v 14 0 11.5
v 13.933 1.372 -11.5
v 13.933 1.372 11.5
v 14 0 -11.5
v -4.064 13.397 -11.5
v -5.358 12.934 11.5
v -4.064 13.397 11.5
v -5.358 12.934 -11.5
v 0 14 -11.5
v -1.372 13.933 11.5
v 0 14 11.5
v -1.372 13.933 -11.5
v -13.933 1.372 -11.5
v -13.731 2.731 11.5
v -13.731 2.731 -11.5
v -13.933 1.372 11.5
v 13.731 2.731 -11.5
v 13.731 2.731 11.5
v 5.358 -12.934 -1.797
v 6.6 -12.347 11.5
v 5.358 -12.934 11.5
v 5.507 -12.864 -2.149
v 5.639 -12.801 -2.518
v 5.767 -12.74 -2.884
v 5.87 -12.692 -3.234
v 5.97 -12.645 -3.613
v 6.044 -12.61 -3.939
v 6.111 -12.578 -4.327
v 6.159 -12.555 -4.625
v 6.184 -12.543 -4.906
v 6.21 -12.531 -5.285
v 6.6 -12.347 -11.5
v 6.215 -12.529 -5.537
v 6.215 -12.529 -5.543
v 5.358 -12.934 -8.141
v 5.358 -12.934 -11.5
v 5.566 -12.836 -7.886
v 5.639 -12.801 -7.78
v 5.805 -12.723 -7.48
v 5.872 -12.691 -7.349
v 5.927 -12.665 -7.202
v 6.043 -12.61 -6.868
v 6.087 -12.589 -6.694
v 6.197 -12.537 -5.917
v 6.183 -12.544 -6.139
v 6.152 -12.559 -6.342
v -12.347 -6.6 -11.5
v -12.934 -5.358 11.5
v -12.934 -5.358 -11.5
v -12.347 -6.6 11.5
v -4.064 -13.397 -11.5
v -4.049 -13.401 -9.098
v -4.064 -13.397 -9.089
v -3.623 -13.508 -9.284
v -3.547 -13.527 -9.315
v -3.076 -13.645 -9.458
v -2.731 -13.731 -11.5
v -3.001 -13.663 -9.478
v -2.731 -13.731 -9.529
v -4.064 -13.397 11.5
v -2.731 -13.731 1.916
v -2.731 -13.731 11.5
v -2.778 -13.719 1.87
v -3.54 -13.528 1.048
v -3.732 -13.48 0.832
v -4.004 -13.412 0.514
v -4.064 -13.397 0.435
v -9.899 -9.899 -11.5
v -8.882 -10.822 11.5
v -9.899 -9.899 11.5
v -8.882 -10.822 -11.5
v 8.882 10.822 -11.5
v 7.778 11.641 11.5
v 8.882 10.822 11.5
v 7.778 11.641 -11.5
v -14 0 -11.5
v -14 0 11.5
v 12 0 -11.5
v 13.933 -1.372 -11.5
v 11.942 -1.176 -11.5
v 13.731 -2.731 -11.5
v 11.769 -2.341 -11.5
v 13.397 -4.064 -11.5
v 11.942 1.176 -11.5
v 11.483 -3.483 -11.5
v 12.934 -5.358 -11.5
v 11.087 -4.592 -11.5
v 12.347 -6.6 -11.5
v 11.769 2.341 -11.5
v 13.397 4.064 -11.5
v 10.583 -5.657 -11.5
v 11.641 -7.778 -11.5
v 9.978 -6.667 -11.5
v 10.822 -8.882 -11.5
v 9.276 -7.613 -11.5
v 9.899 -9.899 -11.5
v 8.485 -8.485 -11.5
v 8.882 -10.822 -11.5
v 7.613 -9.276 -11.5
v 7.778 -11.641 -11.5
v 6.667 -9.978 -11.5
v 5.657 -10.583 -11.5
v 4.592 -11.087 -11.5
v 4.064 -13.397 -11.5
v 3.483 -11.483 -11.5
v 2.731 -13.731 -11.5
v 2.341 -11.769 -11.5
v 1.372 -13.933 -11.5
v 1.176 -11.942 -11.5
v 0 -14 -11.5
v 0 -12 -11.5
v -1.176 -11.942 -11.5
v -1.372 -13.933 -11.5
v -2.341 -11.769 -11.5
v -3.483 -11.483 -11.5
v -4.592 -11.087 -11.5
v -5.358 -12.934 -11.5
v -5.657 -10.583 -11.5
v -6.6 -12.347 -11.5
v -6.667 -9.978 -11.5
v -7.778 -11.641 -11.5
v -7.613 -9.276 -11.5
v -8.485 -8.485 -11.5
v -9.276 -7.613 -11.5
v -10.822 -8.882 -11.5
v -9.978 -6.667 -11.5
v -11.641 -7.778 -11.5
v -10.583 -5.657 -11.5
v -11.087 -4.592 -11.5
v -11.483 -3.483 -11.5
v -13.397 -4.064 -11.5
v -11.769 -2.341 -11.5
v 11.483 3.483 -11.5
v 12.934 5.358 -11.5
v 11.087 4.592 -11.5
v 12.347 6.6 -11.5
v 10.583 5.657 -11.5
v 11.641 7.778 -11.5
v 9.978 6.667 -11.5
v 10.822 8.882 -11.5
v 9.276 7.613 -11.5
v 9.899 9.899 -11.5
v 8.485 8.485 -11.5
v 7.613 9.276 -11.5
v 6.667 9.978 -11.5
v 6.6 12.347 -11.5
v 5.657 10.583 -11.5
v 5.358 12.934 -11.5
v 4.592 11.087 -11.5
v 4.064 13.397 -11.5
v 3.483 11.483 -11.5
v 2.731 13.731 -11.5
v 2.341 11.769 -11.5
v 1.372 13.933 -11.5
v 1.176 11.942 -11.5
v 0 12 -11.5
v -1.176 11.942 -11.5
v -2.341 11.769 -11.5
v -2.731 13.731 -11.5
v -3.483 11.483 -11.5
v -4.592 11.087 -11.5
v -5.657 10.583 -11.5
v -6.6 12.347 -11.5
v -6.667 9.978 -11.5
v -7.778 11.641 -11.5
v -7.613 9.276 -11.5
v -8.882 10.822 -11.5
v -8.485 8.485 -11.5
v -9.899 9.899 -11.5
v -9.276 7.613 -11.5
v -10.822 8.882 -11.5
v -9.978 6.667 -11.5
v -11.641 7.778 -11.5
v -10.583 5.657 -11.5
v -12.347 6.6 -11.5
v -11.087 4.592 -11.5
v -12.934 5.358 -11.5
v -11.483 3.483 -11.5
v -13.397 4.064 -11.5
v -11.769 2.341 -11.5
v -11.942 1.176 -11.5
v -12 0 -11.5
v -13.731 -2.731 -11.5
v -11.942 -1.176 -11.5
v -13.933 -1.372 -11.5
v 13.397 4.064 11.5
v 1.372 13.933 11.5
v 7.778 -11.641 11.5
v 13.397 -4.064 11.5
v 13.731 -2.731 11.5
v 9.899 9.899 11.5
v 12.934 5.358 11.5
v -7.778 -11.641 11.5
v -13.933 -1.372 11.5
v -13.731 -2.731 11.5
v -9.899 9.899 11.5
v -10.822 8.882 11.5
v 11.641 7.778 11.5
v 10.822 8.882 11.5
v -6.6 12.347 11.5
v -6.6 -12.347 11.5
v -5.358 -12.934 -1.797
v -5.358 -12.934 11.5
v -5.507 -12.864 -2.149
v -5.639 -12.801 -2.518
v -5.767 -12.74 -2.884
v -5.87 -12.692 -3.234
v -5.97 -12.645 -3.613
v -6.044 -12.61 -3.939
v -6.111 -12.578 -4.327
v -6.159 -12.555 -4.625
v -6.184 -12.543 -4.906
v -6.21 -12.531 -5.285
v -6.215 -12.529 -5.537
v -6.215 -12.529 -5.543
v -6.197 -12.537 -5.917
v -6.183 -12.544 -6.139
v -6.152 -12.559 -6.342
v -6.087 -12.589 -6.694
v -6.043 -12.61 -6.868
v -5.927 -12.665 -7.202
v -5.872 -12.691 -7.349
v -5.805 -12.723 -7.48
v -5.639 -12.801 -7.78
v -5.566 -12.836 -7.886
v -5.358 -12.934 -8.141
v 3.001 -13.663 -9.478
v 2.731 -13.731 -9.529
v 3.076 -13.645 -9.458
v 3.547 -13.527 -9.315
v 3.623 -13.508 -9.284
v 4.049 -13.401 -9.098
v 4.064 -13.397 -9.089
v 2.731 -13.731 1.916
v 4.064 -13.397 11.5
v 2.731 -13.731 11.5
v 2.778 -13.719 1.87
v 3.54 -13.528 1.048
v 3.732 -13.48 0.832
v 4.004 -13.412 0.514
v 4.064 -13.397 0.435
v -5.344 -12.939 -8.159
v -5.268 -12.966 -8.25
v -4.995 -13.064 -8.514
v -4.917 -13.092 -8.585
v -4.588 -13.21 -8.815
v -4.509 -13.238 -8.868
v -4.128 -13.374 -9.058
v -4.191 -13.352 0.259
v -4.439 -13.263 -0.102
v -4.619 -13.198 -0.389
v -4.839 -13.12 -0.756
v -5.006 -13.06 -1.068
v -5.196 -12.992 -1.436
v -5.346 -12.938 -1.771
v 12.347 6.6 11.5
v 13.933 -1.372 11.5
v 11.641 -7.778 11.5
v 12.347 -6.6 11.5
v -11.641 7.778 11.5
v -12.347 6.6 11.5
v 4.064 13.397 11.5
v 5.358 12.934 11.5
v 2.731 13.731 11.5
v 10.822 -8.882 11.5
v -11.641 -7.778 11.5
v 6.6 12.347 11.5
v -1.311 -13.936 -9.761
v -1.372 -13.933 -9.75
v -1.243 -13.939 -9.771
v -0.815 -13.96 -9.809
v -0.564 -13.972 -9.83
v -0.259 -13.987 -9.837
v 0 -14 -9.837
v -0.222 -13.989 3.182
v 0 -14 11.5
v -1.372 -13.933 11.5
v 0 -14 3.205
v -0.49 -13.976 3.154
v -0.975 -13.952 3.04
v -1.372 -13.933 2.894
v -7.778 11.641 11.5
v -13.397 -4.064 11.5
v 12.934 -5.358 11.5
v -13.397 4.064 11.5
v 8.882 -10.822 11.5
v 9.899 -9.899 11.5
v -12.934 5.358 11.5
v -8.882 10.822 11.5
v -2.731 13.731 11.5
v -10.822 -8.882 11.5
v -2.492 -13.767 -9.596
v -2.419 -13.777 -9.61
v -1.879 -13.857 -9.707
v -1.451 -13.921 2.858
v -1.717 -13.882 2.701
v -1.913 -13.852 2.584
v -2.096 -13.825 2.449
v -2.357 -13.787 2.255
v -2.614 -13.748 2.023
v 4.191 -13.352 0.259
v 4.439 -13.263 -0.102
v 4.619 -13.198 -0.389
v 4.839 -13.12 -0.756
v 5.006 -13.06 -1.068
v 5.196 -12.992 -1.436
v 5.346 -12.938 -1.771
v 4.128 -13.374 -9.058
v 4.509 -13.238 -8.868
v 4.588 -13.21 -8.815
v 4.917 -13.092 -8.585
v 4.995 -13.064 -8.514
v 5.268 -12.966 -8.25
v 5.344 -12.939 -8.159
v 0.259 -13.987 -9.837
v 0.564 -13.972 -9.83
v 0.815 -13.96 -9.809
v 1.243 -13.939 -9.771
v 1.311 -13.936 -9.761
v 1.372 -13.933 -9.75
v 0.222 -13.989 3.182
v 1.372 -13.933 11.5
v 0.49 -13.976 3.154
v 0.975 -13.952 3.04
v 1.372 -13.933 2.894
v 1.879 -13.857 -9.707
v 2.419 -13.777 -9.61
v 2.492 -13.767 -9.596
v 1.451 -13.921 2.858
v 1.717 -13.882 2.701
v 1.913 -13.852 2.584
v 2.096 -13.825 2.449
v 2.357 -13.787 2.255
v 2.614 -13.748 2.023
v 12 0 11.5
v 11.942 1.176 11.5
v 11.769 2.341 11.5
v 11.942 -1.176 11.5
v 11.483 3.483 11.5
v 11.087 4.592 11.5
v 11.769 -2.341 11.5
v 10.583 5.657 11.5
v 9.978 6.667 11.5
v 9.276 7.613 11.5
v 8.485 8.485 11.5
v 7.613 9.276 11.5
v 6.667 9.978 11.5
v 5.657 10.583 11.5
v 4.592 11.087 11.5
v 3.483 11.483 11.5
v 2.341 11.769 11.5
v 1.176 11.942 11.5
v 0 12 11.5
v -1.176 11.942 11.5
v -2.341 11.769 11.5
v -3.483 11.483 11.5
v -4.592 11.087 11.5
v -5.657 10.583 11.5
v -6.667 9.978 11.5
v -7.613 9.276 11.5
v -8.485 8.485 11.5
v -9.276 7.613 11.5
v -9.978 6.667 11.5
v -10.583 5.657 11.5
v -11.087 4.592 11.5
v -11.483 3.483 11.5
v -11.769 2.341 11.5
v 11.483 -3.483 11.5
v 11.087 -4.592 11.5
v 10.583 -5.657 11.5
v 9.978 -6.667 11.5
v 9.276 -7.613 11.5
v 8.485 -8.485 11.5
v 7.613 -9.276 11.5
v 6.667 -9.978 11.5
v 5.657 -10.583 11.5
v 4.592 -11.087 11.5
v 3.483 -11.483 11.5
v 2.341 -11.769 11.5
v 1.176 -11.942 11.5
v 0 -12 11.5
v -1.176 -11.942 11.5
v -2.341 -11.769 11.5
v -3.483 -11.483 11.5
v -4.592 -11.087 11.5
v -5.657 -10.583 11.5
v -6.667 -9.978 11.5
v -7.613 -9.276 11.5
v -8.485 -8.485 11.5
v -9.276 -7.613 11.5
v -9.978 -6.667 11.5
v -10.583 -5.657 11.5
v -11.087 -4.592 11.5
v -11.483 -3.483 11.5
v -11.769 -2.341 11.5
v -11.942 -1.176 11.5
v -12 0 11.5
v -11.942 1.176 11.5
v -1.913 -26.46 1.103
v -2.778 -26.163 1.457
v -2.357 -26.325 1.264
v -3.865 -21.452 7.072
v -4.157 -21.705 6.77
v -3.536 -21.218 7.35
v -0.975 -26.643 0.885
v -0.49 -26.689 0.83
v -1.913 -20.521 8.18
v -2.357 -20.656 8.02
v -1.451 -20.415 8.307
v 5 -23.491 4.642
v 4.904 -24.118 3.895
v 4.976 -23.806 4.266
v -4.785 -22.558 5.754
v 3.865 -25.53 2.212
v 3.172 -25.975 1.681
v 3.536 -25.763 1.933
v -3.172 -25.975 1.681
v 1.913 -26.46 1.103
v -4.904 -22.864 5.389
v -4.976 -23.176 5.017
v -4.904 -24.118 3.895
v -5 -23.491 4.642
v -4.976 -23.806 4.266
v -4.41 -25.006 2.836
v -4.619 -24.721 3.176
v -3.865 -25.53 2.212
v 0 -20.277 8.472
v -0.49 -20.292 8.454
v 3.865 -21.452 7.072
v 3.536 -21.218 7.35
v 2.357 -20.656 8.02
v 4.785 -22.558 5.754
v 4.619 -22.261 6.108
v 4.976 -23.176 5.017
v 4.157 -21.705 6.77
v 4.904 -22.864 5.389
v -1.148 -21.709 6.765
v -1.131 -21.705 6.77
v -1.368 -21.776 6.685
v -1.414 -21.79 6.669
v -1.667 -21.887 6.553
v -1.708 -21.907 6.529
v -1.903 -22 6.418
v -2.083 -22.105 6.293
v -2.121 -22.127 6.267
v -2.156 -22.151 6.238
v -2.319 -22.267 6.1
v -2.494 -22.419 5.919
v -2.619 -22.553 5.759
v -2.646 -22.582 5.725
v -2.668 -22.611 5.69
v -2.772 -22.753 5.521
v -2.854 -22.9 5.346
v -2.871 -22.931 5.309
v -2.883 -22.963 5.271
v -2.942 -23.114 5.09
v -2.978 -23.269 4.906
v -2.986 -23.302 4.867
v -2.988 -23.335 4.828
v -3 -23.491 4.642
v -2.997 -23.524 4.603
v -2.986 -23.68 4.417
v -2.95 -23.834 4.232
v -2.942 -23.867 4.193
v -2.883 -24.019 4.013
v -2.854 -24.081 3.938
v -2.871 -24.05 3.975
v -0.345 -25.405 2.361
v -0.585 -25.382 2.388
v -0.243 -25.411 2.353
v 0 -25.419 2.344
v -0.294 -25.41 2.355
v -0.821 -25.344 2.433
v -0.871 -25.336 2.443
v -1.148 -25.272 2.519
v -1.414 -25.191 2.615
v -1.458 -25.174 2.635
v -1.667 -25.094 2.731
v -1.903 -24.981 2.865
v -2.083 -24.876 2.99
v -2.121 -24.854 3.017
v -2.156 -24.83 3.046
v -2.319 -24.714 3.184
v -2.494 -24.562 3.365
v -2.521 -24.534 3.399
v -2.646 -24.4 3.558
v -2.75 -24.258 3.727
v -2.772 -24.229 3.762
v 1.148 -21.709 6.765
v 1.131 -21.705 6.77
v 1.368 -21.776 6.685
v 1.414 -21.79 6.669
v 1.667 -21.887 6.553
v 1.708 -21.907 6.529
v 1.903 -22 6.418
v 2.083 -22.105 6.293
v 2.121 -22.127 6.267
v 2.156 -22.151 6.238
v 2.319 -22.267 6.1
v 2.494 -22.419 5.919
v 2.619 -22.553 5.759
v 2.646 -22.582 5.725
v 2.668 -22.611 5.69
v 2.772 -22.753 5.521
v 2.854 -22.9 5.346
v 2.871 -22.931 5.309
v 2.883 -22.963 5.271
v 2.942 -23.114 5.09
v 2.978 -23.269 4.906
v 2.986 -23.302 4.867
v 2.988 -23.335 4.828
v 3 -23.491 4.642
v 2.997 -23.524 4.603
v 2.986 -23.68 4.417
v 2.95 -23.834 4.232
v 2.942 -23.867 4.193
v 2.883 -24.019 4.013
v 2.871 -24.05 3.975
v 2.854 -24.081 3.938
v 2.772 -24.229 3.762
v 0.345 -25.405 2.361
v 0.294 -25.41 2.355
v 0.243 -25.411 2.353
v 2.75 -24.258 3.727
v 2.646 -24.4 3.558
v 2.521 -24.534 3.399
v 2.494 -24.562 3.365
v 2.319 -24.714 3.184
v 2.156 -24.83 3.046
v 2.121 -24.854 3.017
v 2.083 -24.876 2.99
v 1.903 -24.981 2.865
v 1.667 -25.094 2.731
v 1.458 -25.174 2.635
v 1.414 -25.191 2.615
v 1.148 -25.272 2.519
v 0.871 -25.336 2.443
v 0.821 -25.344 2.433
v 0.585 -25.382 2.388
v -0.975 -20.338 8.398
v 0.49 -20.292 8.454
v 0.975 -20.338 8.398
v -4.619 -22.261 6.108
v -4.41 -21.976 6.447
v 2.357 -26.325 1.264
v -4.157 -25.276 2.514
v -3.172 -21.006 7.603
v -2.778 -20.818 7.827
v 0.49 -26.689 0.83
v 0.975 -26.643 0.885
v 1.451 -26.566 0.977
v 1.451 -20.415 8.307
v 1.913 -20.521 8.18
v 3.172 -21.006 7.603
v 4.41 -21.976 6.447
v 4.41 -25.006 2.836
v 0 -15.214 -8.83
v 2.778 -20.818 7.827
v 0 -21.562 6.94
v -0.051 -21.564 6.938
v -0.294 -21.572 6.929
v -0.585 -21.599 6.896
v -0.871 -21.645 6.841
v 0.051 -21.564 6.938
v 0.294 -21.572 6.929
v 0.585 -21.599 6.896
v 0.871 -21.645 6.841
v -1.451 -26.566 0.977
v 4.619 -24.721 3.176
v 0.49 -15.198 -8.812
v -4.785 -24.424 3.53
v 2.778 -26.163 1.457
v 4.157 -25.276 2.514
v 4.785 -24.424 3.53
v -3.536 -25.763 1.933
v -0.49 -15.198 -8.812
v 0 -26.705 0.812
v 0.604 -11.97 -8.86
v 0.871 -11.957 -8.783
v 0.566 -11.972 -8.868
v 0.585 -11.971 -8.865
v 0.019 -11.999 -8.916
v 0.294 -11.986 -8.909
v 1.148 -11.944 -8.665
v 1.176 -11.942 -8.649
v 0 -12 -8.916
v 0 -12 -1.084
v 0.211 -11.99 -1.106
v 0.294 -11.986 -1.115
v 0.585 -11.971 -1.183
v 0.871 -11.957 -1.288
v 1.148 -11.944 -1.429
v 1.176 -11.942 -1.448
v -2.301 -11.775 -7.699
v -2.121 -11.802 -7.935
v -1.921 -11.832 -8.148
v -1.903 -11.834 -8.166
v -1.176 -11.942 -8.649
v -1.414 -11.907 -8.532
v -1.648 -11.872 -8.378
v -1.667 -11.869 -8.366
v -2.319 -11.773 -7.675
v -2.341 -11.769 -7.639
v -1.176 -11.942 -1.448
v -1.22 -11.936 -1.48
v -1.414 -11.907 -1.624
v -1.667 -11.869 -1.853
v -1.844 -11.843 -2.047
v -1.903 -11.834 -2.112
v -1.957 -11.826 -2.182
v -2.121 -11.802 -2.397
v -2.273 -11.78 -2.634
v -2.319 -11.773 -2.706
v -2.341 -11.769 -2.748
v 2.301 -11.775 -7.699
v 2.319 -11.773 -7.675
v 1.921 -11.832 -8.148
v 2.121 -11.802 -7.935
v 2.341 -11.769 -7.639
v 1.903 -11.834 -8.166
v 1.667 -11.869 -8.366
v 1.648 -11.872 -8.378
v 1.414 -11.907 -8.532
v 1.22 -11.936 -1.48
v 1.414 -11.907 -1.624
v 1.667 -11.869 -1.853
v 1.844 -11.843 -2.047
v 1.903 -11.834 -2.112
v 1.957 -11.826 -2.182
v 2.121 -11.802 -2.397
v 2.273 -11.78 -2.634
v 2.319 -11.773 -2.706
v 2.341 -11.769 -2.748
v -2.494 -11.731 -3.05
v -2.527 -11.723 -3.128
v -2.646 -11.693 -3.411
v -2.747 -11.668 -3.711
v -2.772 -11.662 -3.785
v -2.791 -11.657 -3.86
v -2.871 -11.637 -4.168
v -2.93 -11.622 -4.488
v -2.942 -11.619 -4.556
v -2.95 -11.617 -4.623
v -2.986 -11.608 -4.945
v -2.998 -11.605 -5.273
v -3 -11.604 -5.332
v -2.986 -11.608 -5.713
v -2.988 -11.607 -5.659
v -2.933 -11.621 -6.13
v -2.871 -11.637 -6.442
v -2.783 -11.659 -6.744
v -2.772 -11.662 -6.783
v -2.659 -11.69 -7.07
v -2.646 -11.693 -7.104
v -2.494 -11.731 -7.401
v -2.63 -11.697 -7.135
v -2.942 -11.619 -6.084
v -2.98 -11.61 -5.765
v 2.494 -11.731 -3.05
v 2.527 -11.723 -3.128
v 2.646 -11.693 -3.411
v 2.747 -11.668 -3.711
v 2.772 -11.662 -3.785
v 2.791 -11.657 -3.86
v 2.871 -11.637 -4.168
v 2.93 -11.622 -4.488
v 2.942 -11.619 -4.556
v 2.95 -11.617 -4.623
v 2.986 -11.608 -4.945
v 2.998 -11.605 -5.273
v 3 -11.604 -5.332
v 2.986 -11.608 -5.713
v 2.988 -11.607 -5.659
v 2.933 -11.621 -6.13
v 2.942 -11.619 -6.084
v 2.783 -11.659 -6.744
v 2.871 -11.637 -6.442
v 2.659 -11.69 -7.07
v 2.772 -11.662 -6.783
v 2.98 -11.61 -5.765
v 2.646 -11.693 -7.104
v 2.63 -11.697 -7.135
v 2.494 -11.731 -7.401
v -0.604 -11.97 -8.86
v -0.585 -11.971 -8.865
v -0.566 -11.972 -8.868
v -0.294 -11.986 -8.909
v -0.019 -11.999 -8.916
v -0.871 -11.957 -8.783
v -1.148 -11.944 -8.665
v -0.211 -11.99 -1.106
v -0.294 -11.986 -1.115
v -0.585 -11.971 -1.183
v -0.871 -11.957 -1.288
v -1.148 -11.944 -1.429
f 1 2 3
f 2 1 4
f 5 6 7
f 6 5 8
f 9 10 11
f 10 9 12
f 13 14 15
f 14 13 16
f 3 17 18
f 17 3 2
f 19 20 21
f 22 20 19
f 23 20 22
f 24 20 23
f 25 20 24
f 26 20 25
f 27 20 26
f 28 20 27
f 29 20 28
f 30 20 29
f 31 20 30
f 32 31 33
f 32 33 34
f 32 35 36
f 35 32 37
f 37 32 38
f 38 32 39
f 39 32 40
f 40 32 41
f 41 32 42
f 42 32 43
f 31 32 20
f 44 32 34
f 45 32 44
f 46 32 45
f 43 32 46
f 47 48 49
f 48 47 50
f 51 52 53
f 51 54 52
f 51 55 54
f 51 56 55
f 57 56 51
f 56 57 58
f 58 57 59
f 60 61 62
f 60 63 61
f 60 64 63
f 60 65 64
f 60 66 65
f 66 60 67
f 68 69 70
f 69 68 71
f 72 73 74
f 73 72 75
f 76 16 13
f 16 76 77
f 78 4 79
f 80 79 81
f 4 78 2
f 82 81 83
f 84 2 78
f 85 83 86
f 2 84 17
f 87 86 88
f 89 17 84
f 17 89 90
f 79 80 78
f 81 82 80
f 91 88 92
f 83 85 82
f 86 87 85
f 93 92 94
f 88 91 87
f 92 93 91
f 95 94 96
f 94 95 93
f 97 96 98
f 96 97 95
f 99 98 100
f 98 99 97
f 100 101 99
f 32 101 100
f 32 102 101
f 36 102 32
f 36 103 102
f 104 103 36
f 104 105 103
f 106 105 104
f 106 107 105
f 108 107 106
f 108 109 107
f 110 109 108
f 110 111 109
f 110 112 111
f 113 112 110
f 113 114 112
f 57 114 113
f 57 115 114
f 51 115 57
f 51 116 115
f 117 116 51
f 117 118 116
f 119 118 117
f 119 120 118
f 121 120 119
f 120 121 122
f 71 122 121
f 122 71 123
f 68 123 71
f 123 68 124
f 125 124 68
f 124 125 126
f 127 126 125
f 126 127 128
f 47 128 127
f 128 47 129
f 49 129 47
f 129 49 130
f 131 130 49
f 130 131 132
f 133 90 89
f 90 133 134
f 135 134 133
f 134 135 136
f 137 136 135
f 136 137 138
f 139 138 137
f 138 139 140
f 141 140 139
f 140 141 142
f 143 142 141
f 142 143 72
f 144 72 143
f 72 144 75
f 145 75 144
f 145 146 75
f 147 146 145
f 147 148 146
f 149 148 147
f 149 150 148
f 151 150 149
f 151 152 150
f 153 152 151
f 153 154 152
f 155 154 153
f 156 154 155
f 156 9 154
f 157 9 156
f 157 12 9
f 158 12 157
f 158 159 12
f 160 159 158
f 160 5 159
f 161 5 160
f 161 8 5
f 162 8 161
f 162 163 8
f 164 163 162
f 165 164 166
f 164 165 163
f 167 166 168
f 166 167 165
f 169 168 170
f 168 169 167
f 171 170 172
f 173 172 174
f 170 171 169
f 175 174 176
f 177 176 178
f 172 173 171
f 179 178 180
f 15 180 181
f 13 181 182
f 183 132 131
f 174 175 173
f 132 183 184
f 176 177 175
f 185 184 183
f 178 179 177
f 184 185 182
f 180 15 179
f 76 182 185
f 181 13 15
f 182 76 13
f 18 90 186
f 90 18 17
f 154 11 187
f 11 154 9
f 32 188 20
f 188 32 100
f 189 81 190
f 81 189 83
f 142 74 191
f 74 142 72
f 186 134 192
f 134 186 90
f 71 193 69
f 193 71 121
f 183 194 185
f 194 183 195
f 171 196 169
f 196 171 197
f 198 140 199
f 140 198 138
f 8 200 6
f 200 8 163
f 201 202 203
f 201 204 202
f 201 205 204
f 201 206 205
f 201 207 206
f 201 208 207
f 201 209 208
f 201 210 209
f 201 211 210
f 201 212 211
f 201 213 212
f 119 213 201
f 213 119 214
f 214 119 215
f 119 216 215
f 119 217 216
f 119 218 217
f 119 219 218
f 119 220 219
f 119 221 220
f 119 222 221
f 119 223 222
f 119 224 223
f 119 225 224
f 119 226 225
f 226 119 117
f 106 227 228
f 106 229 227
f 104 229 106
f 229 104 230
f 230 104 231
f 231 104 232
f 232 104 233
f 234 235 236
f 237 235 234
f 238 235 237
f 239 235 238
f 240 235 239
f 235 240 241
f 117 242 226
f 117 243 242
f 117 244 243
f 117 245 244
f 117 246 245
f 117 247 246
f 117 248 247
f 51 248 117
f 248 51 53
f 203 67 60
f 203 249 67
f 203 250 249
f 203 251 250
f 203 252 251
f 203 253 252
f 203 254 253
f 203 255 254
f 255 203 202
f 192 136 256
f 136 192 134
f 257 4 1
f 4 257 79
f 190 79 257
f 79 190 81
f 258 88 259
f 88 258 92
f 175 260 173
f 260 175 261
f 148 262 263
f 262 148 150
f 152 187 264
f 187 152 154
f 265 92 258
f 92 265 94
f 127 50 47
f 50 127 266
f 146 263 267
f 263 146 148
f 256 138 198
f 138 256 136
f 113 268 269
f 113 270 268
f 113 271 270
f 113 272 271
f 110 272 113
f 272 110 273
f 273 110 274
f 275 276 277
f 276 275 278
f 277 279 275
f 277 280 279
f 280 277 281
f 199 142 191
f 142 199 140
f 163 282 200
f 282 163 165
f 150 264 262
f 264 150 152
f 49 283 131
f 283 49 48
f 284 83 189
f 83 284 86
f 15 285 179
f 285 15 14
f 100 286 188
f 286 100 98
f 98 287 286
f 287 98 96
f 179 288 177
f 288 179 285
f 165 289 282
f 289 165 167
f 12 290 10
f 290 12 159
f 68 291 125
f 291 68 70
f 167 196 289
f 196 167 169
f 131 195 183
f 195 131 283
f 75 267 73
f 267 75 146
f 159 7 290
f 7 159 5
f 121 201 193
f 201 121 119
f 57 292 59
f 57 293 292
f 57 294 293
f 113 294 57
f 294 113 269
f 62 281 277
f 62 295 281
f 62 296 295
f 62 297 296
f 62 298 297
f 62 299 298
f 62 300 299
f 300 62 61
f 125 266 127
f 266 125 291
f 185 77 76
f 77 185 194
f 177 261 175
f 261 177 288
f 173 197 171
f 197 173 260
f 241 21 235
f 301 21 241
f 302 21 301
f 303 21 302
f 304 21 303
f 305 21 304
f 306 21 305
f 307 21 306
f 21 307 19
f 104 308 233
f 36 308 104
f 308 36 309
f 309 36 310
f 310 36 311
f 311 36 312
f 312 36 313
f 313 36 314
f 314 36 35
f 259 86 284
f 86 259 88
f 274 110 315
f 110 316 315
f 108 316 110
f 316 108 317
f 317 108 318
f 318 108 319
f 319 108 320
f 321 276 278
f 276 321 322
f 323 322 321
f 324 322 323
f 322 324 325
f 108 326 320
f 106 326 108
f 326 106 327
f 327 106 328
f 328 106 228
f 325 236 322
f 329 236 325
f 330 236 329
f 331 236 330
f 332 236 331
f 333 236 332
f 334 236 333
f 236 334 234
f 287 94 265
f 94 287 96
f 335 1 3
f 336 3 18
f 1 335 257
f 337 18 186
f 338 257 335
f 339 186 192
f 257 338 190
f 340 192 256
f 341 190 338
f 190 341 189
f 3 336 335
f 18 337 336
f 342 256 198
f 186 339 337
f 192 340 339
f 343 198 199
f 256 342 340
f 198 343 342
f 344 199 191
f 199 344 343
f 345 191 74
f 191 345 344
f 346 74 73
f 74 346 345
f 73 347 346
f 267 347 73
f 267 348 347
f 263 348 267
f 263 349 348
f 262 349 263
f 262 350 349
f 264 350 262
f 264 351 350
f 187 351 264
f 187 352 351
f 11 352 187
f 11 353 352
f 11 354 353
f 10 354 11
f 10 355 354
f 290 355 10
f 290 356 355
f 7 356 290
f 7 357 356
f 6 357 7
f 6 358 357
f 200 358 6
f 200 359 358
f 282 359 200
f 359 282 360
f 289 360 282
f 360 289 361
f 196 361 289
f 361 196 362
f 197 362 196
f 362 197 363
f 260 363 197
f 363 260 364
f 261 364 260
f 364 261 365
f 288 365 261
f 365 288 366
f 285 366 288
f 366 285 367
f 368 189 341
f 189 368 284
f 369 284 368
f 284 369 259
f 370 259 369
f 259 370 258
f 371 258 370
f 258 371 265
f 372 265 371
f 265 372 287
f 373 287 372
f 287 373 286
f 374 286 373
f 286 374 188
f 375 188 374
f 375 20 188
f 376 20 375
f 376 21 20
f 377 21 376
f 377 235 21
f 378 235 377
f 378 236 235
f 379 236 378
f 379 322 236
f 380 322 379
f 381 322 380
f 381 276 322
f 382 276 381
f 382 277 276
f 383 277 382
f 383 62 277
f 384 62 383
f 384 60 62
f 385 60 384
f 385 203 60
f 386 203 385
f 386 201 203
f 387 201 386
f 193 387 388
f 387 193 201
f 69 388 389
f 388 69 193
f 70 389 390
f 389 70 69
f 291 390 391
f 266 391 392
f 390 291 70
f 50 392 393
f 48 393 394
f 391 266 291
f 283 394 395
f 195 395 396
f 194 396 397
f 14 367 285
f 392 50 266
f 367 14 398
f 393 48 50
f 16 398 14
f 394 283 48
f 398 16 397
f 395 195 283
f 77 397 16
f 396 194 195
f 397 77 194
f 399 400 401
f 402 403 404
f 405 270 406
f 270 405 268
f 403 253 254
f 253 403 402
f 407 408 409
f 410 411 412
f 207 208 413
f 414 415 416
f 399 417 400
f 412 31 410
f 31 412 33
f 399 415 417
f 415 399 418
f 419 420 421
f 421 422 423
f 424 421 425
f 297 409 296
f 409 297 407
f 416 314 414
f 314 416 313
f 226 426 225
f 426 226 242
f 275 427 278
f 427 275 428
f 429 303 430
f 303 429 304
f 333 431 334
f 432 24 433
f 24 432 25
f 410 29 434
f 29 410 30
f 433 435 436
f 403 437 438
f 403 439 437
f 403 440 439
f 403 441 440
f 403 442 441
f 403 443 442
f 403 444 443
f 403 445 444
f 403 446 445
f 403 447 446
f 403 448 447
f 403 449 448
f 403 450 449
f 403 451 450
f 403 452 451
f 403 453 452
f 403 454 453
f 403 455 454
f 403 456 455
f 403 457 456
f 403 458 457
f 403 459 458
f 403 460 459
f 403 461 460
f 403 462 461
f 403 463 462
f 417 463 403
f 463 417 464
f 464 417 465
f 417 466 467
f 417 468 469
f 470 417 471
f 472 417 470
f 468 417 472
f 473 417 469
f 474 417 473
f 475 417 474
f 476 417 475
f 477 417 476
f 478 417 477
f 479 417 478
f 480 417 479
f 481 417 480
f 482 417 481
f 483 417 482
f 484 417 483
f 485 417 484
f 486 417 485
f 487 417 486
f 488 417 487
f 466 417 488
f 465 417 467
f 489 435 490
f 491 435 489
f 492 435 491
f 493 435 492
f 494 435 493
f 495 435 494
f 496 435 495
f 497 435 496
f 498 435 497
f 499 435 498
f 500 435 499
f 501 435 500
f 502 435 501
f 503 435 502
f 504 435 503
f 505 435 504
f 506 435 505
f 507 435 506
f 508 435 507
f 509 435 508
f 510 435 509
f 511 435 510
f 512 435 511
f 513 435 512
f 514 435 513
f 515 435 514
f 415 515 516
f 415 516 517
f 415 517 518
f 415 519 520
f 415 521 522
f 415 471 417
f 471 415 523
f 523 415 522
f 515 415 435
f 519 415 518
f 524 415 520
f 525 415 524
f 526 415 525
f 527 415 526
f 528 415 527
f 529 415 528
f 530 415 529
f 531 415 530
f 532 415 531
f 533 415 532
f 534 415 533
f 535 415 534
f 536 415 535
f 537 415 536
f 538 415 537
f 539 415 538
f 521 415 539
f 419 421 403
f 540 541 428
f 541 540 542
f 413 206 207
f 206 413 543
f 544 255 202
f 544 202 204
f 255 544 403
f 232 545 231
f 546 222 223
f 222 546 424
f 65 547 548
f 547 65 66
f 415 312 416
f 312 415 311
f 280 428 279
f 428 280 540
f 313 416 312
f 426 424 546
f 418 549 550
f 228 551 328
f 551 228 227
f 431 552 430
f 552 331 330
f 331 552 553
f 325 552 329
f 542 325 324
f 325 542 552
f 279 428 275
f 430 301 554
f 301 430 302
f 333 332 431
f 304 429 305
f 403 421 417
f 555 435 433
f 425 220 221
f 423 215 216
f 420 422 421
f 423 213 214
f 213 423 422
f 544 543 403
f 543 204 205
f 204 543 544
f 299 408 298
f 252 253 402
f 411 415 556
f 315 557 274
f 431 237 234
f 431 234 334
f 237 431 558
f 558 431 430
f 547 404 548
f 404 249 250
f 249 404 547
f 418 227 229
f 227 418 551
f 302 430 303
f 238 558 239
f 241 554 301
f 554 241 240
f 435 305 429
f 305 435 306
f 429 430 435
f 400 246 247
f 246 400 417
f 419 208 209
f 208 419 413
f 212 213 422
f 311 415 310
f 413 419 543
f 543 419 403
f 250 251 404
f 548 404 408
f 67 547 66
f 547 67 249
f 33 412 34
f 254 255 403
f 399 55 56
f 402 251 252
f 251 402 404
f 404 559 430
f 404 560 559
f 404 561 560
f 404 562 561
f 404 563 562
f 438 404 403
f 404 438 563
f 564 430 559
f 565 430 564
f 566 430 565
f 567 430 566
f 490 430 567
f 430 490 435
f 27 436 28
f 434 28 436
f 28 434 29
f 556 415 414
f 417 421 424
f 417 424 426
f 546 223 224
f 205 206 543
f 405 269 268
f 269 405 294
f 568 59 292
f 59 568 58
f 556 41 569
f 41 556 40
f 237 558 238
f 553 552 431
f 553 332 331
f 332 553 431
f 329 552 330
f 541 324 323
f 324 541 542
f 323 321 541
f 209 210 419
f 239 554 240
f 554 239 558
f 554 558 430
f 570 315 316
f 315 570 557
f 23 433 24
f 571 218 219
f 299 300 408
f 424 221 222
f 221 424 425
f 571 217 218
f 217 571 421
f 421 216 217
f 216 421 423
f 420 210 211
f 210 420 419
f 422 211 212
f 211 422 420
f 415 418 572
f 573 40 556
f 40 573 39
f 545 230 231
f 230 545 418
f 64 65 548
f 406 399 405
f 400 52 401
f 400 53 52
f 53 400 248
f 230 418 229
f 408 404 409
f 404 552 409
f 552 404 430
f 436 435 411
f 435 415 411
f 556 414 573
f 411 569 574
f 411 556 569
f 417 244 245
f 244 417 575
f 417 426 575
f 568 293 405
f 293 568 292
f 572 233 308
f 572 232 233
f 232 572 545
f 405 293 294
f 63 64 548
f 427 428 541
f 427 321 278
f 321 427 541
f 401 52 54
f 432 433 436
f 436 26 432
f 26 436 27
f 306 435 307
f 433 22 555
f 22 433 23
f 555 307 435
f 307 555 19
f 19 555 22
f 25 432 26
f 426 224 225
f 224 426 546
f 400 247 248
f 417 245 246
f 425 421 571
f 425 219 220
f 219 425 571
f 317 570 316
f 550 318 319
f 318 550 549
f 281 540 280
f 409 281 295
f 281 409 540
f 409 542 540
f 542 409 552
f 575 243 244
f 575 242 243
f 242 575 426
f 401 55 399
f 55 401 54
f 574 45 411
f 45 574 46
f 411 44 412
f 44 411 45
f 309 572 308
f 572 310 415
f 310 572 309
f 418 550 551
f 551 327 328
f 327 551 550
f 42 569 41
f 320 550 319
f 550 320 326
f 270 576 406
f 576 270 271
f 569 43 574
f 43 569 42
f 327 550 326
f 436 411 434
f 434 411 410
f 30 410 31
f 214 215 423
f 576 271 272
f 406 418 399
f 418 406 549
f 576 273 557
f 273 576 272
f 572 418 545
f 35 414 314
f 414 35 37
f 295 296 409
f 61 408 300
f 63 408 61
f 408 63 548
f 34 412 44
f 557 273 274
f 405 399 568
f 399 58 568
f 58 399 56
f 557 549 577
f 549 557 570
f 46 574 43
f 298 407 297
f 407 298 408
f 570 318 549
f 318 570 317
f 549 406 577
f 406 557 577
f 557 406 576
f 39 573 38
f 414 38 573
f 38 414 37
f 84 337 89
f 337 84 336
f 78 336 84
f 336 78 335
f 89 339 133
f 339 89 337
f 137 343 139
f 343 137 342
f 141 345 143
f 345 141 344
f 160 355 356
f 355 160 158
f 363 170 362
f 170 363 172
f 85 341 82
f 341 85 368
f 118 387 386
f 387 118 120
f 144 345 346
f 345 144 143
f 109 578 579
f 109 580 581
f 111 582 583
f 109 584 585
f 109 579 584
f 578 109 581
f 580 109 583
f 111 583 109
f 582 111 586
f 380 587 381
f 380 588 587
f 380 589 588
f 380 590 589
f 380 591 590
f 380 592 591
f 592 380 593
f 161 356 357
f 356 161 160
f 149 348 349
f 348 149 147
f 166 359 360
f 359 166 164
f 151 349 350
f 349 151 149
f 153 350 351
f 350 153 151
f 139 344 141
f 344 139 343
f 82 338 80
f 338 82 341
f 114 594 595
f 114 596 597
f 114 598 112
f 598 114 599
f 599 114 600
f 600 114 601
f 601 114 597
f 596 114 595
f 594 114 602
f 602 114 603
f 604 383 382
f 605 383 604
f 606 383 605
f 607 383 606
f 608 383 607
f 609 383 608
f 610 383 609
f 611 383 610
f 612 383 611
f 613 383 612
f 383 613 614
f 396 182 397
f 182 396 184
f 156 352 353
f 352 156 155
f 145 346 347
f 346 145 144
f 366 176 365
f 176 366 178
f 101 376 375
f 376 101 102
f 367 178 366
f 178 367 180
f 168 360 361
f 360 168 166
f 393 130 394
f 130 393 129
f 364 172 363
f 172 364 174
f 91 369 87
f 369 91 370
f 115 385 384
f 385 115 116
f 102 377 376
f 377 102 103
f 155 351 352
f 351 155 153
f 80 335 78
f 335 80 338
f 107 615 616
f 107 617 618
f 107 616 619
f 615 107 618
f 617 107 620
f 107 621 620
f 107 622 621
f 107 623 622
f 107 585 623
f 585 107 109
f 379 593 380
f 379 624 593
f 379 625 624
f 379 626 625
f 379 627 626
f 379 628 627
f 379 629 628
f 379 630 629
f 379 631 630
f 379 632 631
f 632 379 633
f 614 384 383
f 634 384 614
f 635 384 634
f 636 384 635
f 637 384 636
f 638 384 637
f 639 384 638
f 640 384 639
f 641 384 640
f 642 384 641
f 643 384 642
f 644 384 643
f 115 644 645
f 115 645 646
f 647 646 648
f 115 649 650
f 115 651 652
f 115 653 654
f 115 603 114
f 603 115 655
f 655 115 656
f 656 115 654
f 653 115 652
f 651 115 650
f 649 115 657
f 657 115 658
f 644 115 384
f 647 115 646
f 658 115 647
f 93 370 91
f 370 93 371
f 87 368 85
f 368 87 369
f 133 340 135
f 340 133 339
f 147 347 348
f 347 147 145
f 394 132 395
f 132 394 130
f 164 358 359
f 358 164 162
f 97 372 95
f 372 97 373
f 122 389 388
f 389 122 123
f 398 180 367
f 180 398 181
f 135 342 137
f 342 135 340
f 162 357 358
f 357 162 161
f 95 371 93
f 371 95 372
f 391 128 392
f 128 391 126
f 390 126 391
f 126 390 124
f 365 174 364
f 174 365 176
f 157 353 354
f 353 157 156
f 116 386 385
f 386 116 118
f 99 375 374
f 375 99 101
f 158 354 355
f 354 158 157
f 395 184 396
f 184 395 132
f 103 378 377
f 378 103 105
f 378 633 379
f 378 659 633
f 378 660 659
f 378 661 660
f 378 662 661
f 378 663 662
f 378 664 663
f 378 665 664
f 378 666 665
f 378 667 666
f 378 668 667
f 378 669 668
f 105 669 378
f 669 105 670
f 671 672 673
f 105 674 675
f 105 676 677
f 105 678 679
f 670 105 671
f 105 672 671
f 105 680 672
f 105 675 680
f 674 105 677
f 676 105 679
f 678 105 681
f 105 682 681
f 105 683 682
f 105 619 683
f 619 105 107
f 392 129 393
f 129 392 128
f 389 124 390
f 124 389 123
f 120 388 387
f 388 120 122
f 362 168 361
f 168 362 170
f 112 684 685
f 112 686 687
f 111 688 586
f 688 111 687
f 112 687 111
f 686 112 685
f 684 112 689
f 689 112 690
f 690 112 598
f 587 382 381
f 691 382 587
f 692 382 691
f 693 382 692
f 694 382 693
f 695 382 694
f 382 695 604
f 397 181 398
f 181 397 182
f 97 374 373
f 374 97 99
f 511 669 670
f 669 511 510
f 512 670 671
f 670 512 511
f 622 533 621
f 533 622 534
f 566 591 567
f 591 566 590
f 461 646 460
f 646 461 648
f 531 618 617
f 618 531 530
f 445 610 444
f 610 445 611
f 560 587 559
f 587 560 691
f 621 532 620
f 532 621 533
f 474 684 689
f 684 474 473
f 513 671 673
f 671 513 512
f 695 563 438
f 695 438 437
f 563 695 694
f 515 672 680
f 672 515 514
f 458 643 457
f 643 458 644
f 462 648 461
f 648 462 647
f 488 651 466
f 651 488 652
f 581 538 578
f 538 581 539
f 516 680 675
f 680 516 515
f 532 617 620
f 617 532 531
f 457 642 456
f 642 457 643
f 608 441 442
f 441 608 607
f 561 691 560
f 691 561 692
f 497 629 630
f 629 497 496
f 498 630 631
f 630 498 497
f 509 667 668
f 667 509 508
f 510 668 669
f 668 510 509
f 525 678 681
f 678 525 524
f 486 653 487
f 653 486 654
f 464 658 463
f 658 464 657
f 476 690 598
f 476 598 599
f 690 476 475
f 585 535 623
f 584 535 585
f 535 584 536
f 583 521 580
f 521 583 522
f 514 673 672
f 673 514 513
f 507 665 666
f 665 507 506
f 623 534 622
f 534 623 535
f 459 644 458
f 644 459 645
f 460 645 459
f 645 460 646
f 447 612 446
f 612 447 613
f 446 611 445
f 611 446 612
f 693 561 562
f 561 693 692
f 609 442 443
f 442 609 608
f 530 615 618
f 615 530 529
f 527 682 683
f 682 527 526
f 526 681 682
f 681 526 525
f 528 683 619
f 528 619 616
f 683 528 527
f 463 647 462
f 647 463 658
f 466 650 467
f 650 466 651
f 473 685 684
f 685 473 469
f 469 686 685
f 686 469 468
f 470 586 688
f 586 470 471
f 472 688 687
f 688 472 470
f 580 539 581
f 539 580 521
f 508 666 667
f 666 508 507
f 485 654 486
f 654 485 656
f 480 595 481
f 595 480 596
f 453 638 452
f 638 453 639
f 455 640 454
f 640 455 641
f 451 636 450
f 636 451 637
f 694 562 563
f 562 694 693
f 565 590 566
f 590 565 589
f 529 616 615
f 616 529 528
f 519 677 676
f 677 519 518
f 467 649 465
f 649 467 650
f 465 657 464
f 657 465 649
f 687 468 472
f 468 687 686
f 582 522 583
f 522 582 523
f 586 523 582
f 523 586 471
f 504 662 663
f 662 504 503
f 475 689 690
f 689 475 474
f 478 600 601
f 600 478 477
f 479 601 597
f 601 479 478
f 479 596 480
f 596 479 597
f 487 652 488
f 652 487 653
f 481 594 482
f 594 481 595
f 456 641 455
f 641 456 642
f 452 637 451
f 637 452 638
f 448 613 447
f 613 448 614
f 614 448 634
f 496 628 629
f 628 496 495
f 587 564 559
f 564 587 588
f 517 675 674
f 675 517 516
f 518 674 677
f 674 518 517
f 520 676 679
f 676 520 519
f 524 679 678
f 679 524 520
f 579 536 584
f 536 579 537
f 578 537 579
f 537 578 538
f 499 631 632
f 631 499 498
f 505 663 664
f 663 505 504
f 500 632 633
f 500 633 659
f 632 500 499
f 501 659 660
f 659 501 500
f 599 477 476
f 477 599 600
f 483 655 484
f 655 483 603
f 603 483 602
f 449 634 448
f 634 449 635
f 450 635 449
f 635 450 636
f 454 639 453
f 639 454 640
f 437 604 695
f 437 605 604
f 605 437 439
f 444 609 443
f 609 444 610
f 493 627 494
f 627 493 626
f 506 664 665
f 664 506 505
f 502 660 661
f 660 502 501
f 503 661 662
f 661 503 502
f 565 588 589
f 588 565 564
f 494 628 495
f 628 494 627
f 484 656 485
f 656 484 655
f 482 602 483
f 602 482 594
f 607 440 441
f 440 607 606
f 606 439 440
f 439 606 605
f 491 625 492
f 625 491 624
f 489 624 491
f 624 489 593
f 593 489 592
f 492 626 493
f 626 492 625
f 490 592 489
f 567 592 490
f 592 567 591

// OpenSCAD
$fn=64;
EPS=0.01;

// Big Pipe
MountingDia=24;
WallThickness=2;
Height=23;

// Fountain Pipe
FountainDia=10;
FountainWall=2;
FountainHeight=15;

HullCylinderDisplacement=5;

difference() {
    union() {
        cylinder(h=Height, r=WallThickness+MountingDia/2, center=true);

        hull() {
            translate([0,-HullCylinderDisplacement,-Height/2+EPS])
                cylinder(h=EPS, r=MountingDia/2-HullCylinderDisplacement, center=true);
            translate([0,-MountingDia/2,-FountainDia/2]) rotate(50,[1,0,0])
                cylinder(h=FountainHeight, r=FountainDia/2);
        }
    }

    cylinder(h=Height+EPS, r=MountingDia/2, center=true);
    translate([0,-MountingDia/2,-FountainDia/2]) rotate(50,[1,0,0]) translate([0,0,FountainHeight/2])
        cylinder(h=FountainHeight+WallThickness*4, r=FountainDia/2-FountainWall, center=true);

}


module pipe(h, r, wall, c=true) {
    difference() {
        cylinder(h=Height, r=r, center=c);

        //cylinder(h=Height+EPS, r=r-wall, center=c);
    }
}
